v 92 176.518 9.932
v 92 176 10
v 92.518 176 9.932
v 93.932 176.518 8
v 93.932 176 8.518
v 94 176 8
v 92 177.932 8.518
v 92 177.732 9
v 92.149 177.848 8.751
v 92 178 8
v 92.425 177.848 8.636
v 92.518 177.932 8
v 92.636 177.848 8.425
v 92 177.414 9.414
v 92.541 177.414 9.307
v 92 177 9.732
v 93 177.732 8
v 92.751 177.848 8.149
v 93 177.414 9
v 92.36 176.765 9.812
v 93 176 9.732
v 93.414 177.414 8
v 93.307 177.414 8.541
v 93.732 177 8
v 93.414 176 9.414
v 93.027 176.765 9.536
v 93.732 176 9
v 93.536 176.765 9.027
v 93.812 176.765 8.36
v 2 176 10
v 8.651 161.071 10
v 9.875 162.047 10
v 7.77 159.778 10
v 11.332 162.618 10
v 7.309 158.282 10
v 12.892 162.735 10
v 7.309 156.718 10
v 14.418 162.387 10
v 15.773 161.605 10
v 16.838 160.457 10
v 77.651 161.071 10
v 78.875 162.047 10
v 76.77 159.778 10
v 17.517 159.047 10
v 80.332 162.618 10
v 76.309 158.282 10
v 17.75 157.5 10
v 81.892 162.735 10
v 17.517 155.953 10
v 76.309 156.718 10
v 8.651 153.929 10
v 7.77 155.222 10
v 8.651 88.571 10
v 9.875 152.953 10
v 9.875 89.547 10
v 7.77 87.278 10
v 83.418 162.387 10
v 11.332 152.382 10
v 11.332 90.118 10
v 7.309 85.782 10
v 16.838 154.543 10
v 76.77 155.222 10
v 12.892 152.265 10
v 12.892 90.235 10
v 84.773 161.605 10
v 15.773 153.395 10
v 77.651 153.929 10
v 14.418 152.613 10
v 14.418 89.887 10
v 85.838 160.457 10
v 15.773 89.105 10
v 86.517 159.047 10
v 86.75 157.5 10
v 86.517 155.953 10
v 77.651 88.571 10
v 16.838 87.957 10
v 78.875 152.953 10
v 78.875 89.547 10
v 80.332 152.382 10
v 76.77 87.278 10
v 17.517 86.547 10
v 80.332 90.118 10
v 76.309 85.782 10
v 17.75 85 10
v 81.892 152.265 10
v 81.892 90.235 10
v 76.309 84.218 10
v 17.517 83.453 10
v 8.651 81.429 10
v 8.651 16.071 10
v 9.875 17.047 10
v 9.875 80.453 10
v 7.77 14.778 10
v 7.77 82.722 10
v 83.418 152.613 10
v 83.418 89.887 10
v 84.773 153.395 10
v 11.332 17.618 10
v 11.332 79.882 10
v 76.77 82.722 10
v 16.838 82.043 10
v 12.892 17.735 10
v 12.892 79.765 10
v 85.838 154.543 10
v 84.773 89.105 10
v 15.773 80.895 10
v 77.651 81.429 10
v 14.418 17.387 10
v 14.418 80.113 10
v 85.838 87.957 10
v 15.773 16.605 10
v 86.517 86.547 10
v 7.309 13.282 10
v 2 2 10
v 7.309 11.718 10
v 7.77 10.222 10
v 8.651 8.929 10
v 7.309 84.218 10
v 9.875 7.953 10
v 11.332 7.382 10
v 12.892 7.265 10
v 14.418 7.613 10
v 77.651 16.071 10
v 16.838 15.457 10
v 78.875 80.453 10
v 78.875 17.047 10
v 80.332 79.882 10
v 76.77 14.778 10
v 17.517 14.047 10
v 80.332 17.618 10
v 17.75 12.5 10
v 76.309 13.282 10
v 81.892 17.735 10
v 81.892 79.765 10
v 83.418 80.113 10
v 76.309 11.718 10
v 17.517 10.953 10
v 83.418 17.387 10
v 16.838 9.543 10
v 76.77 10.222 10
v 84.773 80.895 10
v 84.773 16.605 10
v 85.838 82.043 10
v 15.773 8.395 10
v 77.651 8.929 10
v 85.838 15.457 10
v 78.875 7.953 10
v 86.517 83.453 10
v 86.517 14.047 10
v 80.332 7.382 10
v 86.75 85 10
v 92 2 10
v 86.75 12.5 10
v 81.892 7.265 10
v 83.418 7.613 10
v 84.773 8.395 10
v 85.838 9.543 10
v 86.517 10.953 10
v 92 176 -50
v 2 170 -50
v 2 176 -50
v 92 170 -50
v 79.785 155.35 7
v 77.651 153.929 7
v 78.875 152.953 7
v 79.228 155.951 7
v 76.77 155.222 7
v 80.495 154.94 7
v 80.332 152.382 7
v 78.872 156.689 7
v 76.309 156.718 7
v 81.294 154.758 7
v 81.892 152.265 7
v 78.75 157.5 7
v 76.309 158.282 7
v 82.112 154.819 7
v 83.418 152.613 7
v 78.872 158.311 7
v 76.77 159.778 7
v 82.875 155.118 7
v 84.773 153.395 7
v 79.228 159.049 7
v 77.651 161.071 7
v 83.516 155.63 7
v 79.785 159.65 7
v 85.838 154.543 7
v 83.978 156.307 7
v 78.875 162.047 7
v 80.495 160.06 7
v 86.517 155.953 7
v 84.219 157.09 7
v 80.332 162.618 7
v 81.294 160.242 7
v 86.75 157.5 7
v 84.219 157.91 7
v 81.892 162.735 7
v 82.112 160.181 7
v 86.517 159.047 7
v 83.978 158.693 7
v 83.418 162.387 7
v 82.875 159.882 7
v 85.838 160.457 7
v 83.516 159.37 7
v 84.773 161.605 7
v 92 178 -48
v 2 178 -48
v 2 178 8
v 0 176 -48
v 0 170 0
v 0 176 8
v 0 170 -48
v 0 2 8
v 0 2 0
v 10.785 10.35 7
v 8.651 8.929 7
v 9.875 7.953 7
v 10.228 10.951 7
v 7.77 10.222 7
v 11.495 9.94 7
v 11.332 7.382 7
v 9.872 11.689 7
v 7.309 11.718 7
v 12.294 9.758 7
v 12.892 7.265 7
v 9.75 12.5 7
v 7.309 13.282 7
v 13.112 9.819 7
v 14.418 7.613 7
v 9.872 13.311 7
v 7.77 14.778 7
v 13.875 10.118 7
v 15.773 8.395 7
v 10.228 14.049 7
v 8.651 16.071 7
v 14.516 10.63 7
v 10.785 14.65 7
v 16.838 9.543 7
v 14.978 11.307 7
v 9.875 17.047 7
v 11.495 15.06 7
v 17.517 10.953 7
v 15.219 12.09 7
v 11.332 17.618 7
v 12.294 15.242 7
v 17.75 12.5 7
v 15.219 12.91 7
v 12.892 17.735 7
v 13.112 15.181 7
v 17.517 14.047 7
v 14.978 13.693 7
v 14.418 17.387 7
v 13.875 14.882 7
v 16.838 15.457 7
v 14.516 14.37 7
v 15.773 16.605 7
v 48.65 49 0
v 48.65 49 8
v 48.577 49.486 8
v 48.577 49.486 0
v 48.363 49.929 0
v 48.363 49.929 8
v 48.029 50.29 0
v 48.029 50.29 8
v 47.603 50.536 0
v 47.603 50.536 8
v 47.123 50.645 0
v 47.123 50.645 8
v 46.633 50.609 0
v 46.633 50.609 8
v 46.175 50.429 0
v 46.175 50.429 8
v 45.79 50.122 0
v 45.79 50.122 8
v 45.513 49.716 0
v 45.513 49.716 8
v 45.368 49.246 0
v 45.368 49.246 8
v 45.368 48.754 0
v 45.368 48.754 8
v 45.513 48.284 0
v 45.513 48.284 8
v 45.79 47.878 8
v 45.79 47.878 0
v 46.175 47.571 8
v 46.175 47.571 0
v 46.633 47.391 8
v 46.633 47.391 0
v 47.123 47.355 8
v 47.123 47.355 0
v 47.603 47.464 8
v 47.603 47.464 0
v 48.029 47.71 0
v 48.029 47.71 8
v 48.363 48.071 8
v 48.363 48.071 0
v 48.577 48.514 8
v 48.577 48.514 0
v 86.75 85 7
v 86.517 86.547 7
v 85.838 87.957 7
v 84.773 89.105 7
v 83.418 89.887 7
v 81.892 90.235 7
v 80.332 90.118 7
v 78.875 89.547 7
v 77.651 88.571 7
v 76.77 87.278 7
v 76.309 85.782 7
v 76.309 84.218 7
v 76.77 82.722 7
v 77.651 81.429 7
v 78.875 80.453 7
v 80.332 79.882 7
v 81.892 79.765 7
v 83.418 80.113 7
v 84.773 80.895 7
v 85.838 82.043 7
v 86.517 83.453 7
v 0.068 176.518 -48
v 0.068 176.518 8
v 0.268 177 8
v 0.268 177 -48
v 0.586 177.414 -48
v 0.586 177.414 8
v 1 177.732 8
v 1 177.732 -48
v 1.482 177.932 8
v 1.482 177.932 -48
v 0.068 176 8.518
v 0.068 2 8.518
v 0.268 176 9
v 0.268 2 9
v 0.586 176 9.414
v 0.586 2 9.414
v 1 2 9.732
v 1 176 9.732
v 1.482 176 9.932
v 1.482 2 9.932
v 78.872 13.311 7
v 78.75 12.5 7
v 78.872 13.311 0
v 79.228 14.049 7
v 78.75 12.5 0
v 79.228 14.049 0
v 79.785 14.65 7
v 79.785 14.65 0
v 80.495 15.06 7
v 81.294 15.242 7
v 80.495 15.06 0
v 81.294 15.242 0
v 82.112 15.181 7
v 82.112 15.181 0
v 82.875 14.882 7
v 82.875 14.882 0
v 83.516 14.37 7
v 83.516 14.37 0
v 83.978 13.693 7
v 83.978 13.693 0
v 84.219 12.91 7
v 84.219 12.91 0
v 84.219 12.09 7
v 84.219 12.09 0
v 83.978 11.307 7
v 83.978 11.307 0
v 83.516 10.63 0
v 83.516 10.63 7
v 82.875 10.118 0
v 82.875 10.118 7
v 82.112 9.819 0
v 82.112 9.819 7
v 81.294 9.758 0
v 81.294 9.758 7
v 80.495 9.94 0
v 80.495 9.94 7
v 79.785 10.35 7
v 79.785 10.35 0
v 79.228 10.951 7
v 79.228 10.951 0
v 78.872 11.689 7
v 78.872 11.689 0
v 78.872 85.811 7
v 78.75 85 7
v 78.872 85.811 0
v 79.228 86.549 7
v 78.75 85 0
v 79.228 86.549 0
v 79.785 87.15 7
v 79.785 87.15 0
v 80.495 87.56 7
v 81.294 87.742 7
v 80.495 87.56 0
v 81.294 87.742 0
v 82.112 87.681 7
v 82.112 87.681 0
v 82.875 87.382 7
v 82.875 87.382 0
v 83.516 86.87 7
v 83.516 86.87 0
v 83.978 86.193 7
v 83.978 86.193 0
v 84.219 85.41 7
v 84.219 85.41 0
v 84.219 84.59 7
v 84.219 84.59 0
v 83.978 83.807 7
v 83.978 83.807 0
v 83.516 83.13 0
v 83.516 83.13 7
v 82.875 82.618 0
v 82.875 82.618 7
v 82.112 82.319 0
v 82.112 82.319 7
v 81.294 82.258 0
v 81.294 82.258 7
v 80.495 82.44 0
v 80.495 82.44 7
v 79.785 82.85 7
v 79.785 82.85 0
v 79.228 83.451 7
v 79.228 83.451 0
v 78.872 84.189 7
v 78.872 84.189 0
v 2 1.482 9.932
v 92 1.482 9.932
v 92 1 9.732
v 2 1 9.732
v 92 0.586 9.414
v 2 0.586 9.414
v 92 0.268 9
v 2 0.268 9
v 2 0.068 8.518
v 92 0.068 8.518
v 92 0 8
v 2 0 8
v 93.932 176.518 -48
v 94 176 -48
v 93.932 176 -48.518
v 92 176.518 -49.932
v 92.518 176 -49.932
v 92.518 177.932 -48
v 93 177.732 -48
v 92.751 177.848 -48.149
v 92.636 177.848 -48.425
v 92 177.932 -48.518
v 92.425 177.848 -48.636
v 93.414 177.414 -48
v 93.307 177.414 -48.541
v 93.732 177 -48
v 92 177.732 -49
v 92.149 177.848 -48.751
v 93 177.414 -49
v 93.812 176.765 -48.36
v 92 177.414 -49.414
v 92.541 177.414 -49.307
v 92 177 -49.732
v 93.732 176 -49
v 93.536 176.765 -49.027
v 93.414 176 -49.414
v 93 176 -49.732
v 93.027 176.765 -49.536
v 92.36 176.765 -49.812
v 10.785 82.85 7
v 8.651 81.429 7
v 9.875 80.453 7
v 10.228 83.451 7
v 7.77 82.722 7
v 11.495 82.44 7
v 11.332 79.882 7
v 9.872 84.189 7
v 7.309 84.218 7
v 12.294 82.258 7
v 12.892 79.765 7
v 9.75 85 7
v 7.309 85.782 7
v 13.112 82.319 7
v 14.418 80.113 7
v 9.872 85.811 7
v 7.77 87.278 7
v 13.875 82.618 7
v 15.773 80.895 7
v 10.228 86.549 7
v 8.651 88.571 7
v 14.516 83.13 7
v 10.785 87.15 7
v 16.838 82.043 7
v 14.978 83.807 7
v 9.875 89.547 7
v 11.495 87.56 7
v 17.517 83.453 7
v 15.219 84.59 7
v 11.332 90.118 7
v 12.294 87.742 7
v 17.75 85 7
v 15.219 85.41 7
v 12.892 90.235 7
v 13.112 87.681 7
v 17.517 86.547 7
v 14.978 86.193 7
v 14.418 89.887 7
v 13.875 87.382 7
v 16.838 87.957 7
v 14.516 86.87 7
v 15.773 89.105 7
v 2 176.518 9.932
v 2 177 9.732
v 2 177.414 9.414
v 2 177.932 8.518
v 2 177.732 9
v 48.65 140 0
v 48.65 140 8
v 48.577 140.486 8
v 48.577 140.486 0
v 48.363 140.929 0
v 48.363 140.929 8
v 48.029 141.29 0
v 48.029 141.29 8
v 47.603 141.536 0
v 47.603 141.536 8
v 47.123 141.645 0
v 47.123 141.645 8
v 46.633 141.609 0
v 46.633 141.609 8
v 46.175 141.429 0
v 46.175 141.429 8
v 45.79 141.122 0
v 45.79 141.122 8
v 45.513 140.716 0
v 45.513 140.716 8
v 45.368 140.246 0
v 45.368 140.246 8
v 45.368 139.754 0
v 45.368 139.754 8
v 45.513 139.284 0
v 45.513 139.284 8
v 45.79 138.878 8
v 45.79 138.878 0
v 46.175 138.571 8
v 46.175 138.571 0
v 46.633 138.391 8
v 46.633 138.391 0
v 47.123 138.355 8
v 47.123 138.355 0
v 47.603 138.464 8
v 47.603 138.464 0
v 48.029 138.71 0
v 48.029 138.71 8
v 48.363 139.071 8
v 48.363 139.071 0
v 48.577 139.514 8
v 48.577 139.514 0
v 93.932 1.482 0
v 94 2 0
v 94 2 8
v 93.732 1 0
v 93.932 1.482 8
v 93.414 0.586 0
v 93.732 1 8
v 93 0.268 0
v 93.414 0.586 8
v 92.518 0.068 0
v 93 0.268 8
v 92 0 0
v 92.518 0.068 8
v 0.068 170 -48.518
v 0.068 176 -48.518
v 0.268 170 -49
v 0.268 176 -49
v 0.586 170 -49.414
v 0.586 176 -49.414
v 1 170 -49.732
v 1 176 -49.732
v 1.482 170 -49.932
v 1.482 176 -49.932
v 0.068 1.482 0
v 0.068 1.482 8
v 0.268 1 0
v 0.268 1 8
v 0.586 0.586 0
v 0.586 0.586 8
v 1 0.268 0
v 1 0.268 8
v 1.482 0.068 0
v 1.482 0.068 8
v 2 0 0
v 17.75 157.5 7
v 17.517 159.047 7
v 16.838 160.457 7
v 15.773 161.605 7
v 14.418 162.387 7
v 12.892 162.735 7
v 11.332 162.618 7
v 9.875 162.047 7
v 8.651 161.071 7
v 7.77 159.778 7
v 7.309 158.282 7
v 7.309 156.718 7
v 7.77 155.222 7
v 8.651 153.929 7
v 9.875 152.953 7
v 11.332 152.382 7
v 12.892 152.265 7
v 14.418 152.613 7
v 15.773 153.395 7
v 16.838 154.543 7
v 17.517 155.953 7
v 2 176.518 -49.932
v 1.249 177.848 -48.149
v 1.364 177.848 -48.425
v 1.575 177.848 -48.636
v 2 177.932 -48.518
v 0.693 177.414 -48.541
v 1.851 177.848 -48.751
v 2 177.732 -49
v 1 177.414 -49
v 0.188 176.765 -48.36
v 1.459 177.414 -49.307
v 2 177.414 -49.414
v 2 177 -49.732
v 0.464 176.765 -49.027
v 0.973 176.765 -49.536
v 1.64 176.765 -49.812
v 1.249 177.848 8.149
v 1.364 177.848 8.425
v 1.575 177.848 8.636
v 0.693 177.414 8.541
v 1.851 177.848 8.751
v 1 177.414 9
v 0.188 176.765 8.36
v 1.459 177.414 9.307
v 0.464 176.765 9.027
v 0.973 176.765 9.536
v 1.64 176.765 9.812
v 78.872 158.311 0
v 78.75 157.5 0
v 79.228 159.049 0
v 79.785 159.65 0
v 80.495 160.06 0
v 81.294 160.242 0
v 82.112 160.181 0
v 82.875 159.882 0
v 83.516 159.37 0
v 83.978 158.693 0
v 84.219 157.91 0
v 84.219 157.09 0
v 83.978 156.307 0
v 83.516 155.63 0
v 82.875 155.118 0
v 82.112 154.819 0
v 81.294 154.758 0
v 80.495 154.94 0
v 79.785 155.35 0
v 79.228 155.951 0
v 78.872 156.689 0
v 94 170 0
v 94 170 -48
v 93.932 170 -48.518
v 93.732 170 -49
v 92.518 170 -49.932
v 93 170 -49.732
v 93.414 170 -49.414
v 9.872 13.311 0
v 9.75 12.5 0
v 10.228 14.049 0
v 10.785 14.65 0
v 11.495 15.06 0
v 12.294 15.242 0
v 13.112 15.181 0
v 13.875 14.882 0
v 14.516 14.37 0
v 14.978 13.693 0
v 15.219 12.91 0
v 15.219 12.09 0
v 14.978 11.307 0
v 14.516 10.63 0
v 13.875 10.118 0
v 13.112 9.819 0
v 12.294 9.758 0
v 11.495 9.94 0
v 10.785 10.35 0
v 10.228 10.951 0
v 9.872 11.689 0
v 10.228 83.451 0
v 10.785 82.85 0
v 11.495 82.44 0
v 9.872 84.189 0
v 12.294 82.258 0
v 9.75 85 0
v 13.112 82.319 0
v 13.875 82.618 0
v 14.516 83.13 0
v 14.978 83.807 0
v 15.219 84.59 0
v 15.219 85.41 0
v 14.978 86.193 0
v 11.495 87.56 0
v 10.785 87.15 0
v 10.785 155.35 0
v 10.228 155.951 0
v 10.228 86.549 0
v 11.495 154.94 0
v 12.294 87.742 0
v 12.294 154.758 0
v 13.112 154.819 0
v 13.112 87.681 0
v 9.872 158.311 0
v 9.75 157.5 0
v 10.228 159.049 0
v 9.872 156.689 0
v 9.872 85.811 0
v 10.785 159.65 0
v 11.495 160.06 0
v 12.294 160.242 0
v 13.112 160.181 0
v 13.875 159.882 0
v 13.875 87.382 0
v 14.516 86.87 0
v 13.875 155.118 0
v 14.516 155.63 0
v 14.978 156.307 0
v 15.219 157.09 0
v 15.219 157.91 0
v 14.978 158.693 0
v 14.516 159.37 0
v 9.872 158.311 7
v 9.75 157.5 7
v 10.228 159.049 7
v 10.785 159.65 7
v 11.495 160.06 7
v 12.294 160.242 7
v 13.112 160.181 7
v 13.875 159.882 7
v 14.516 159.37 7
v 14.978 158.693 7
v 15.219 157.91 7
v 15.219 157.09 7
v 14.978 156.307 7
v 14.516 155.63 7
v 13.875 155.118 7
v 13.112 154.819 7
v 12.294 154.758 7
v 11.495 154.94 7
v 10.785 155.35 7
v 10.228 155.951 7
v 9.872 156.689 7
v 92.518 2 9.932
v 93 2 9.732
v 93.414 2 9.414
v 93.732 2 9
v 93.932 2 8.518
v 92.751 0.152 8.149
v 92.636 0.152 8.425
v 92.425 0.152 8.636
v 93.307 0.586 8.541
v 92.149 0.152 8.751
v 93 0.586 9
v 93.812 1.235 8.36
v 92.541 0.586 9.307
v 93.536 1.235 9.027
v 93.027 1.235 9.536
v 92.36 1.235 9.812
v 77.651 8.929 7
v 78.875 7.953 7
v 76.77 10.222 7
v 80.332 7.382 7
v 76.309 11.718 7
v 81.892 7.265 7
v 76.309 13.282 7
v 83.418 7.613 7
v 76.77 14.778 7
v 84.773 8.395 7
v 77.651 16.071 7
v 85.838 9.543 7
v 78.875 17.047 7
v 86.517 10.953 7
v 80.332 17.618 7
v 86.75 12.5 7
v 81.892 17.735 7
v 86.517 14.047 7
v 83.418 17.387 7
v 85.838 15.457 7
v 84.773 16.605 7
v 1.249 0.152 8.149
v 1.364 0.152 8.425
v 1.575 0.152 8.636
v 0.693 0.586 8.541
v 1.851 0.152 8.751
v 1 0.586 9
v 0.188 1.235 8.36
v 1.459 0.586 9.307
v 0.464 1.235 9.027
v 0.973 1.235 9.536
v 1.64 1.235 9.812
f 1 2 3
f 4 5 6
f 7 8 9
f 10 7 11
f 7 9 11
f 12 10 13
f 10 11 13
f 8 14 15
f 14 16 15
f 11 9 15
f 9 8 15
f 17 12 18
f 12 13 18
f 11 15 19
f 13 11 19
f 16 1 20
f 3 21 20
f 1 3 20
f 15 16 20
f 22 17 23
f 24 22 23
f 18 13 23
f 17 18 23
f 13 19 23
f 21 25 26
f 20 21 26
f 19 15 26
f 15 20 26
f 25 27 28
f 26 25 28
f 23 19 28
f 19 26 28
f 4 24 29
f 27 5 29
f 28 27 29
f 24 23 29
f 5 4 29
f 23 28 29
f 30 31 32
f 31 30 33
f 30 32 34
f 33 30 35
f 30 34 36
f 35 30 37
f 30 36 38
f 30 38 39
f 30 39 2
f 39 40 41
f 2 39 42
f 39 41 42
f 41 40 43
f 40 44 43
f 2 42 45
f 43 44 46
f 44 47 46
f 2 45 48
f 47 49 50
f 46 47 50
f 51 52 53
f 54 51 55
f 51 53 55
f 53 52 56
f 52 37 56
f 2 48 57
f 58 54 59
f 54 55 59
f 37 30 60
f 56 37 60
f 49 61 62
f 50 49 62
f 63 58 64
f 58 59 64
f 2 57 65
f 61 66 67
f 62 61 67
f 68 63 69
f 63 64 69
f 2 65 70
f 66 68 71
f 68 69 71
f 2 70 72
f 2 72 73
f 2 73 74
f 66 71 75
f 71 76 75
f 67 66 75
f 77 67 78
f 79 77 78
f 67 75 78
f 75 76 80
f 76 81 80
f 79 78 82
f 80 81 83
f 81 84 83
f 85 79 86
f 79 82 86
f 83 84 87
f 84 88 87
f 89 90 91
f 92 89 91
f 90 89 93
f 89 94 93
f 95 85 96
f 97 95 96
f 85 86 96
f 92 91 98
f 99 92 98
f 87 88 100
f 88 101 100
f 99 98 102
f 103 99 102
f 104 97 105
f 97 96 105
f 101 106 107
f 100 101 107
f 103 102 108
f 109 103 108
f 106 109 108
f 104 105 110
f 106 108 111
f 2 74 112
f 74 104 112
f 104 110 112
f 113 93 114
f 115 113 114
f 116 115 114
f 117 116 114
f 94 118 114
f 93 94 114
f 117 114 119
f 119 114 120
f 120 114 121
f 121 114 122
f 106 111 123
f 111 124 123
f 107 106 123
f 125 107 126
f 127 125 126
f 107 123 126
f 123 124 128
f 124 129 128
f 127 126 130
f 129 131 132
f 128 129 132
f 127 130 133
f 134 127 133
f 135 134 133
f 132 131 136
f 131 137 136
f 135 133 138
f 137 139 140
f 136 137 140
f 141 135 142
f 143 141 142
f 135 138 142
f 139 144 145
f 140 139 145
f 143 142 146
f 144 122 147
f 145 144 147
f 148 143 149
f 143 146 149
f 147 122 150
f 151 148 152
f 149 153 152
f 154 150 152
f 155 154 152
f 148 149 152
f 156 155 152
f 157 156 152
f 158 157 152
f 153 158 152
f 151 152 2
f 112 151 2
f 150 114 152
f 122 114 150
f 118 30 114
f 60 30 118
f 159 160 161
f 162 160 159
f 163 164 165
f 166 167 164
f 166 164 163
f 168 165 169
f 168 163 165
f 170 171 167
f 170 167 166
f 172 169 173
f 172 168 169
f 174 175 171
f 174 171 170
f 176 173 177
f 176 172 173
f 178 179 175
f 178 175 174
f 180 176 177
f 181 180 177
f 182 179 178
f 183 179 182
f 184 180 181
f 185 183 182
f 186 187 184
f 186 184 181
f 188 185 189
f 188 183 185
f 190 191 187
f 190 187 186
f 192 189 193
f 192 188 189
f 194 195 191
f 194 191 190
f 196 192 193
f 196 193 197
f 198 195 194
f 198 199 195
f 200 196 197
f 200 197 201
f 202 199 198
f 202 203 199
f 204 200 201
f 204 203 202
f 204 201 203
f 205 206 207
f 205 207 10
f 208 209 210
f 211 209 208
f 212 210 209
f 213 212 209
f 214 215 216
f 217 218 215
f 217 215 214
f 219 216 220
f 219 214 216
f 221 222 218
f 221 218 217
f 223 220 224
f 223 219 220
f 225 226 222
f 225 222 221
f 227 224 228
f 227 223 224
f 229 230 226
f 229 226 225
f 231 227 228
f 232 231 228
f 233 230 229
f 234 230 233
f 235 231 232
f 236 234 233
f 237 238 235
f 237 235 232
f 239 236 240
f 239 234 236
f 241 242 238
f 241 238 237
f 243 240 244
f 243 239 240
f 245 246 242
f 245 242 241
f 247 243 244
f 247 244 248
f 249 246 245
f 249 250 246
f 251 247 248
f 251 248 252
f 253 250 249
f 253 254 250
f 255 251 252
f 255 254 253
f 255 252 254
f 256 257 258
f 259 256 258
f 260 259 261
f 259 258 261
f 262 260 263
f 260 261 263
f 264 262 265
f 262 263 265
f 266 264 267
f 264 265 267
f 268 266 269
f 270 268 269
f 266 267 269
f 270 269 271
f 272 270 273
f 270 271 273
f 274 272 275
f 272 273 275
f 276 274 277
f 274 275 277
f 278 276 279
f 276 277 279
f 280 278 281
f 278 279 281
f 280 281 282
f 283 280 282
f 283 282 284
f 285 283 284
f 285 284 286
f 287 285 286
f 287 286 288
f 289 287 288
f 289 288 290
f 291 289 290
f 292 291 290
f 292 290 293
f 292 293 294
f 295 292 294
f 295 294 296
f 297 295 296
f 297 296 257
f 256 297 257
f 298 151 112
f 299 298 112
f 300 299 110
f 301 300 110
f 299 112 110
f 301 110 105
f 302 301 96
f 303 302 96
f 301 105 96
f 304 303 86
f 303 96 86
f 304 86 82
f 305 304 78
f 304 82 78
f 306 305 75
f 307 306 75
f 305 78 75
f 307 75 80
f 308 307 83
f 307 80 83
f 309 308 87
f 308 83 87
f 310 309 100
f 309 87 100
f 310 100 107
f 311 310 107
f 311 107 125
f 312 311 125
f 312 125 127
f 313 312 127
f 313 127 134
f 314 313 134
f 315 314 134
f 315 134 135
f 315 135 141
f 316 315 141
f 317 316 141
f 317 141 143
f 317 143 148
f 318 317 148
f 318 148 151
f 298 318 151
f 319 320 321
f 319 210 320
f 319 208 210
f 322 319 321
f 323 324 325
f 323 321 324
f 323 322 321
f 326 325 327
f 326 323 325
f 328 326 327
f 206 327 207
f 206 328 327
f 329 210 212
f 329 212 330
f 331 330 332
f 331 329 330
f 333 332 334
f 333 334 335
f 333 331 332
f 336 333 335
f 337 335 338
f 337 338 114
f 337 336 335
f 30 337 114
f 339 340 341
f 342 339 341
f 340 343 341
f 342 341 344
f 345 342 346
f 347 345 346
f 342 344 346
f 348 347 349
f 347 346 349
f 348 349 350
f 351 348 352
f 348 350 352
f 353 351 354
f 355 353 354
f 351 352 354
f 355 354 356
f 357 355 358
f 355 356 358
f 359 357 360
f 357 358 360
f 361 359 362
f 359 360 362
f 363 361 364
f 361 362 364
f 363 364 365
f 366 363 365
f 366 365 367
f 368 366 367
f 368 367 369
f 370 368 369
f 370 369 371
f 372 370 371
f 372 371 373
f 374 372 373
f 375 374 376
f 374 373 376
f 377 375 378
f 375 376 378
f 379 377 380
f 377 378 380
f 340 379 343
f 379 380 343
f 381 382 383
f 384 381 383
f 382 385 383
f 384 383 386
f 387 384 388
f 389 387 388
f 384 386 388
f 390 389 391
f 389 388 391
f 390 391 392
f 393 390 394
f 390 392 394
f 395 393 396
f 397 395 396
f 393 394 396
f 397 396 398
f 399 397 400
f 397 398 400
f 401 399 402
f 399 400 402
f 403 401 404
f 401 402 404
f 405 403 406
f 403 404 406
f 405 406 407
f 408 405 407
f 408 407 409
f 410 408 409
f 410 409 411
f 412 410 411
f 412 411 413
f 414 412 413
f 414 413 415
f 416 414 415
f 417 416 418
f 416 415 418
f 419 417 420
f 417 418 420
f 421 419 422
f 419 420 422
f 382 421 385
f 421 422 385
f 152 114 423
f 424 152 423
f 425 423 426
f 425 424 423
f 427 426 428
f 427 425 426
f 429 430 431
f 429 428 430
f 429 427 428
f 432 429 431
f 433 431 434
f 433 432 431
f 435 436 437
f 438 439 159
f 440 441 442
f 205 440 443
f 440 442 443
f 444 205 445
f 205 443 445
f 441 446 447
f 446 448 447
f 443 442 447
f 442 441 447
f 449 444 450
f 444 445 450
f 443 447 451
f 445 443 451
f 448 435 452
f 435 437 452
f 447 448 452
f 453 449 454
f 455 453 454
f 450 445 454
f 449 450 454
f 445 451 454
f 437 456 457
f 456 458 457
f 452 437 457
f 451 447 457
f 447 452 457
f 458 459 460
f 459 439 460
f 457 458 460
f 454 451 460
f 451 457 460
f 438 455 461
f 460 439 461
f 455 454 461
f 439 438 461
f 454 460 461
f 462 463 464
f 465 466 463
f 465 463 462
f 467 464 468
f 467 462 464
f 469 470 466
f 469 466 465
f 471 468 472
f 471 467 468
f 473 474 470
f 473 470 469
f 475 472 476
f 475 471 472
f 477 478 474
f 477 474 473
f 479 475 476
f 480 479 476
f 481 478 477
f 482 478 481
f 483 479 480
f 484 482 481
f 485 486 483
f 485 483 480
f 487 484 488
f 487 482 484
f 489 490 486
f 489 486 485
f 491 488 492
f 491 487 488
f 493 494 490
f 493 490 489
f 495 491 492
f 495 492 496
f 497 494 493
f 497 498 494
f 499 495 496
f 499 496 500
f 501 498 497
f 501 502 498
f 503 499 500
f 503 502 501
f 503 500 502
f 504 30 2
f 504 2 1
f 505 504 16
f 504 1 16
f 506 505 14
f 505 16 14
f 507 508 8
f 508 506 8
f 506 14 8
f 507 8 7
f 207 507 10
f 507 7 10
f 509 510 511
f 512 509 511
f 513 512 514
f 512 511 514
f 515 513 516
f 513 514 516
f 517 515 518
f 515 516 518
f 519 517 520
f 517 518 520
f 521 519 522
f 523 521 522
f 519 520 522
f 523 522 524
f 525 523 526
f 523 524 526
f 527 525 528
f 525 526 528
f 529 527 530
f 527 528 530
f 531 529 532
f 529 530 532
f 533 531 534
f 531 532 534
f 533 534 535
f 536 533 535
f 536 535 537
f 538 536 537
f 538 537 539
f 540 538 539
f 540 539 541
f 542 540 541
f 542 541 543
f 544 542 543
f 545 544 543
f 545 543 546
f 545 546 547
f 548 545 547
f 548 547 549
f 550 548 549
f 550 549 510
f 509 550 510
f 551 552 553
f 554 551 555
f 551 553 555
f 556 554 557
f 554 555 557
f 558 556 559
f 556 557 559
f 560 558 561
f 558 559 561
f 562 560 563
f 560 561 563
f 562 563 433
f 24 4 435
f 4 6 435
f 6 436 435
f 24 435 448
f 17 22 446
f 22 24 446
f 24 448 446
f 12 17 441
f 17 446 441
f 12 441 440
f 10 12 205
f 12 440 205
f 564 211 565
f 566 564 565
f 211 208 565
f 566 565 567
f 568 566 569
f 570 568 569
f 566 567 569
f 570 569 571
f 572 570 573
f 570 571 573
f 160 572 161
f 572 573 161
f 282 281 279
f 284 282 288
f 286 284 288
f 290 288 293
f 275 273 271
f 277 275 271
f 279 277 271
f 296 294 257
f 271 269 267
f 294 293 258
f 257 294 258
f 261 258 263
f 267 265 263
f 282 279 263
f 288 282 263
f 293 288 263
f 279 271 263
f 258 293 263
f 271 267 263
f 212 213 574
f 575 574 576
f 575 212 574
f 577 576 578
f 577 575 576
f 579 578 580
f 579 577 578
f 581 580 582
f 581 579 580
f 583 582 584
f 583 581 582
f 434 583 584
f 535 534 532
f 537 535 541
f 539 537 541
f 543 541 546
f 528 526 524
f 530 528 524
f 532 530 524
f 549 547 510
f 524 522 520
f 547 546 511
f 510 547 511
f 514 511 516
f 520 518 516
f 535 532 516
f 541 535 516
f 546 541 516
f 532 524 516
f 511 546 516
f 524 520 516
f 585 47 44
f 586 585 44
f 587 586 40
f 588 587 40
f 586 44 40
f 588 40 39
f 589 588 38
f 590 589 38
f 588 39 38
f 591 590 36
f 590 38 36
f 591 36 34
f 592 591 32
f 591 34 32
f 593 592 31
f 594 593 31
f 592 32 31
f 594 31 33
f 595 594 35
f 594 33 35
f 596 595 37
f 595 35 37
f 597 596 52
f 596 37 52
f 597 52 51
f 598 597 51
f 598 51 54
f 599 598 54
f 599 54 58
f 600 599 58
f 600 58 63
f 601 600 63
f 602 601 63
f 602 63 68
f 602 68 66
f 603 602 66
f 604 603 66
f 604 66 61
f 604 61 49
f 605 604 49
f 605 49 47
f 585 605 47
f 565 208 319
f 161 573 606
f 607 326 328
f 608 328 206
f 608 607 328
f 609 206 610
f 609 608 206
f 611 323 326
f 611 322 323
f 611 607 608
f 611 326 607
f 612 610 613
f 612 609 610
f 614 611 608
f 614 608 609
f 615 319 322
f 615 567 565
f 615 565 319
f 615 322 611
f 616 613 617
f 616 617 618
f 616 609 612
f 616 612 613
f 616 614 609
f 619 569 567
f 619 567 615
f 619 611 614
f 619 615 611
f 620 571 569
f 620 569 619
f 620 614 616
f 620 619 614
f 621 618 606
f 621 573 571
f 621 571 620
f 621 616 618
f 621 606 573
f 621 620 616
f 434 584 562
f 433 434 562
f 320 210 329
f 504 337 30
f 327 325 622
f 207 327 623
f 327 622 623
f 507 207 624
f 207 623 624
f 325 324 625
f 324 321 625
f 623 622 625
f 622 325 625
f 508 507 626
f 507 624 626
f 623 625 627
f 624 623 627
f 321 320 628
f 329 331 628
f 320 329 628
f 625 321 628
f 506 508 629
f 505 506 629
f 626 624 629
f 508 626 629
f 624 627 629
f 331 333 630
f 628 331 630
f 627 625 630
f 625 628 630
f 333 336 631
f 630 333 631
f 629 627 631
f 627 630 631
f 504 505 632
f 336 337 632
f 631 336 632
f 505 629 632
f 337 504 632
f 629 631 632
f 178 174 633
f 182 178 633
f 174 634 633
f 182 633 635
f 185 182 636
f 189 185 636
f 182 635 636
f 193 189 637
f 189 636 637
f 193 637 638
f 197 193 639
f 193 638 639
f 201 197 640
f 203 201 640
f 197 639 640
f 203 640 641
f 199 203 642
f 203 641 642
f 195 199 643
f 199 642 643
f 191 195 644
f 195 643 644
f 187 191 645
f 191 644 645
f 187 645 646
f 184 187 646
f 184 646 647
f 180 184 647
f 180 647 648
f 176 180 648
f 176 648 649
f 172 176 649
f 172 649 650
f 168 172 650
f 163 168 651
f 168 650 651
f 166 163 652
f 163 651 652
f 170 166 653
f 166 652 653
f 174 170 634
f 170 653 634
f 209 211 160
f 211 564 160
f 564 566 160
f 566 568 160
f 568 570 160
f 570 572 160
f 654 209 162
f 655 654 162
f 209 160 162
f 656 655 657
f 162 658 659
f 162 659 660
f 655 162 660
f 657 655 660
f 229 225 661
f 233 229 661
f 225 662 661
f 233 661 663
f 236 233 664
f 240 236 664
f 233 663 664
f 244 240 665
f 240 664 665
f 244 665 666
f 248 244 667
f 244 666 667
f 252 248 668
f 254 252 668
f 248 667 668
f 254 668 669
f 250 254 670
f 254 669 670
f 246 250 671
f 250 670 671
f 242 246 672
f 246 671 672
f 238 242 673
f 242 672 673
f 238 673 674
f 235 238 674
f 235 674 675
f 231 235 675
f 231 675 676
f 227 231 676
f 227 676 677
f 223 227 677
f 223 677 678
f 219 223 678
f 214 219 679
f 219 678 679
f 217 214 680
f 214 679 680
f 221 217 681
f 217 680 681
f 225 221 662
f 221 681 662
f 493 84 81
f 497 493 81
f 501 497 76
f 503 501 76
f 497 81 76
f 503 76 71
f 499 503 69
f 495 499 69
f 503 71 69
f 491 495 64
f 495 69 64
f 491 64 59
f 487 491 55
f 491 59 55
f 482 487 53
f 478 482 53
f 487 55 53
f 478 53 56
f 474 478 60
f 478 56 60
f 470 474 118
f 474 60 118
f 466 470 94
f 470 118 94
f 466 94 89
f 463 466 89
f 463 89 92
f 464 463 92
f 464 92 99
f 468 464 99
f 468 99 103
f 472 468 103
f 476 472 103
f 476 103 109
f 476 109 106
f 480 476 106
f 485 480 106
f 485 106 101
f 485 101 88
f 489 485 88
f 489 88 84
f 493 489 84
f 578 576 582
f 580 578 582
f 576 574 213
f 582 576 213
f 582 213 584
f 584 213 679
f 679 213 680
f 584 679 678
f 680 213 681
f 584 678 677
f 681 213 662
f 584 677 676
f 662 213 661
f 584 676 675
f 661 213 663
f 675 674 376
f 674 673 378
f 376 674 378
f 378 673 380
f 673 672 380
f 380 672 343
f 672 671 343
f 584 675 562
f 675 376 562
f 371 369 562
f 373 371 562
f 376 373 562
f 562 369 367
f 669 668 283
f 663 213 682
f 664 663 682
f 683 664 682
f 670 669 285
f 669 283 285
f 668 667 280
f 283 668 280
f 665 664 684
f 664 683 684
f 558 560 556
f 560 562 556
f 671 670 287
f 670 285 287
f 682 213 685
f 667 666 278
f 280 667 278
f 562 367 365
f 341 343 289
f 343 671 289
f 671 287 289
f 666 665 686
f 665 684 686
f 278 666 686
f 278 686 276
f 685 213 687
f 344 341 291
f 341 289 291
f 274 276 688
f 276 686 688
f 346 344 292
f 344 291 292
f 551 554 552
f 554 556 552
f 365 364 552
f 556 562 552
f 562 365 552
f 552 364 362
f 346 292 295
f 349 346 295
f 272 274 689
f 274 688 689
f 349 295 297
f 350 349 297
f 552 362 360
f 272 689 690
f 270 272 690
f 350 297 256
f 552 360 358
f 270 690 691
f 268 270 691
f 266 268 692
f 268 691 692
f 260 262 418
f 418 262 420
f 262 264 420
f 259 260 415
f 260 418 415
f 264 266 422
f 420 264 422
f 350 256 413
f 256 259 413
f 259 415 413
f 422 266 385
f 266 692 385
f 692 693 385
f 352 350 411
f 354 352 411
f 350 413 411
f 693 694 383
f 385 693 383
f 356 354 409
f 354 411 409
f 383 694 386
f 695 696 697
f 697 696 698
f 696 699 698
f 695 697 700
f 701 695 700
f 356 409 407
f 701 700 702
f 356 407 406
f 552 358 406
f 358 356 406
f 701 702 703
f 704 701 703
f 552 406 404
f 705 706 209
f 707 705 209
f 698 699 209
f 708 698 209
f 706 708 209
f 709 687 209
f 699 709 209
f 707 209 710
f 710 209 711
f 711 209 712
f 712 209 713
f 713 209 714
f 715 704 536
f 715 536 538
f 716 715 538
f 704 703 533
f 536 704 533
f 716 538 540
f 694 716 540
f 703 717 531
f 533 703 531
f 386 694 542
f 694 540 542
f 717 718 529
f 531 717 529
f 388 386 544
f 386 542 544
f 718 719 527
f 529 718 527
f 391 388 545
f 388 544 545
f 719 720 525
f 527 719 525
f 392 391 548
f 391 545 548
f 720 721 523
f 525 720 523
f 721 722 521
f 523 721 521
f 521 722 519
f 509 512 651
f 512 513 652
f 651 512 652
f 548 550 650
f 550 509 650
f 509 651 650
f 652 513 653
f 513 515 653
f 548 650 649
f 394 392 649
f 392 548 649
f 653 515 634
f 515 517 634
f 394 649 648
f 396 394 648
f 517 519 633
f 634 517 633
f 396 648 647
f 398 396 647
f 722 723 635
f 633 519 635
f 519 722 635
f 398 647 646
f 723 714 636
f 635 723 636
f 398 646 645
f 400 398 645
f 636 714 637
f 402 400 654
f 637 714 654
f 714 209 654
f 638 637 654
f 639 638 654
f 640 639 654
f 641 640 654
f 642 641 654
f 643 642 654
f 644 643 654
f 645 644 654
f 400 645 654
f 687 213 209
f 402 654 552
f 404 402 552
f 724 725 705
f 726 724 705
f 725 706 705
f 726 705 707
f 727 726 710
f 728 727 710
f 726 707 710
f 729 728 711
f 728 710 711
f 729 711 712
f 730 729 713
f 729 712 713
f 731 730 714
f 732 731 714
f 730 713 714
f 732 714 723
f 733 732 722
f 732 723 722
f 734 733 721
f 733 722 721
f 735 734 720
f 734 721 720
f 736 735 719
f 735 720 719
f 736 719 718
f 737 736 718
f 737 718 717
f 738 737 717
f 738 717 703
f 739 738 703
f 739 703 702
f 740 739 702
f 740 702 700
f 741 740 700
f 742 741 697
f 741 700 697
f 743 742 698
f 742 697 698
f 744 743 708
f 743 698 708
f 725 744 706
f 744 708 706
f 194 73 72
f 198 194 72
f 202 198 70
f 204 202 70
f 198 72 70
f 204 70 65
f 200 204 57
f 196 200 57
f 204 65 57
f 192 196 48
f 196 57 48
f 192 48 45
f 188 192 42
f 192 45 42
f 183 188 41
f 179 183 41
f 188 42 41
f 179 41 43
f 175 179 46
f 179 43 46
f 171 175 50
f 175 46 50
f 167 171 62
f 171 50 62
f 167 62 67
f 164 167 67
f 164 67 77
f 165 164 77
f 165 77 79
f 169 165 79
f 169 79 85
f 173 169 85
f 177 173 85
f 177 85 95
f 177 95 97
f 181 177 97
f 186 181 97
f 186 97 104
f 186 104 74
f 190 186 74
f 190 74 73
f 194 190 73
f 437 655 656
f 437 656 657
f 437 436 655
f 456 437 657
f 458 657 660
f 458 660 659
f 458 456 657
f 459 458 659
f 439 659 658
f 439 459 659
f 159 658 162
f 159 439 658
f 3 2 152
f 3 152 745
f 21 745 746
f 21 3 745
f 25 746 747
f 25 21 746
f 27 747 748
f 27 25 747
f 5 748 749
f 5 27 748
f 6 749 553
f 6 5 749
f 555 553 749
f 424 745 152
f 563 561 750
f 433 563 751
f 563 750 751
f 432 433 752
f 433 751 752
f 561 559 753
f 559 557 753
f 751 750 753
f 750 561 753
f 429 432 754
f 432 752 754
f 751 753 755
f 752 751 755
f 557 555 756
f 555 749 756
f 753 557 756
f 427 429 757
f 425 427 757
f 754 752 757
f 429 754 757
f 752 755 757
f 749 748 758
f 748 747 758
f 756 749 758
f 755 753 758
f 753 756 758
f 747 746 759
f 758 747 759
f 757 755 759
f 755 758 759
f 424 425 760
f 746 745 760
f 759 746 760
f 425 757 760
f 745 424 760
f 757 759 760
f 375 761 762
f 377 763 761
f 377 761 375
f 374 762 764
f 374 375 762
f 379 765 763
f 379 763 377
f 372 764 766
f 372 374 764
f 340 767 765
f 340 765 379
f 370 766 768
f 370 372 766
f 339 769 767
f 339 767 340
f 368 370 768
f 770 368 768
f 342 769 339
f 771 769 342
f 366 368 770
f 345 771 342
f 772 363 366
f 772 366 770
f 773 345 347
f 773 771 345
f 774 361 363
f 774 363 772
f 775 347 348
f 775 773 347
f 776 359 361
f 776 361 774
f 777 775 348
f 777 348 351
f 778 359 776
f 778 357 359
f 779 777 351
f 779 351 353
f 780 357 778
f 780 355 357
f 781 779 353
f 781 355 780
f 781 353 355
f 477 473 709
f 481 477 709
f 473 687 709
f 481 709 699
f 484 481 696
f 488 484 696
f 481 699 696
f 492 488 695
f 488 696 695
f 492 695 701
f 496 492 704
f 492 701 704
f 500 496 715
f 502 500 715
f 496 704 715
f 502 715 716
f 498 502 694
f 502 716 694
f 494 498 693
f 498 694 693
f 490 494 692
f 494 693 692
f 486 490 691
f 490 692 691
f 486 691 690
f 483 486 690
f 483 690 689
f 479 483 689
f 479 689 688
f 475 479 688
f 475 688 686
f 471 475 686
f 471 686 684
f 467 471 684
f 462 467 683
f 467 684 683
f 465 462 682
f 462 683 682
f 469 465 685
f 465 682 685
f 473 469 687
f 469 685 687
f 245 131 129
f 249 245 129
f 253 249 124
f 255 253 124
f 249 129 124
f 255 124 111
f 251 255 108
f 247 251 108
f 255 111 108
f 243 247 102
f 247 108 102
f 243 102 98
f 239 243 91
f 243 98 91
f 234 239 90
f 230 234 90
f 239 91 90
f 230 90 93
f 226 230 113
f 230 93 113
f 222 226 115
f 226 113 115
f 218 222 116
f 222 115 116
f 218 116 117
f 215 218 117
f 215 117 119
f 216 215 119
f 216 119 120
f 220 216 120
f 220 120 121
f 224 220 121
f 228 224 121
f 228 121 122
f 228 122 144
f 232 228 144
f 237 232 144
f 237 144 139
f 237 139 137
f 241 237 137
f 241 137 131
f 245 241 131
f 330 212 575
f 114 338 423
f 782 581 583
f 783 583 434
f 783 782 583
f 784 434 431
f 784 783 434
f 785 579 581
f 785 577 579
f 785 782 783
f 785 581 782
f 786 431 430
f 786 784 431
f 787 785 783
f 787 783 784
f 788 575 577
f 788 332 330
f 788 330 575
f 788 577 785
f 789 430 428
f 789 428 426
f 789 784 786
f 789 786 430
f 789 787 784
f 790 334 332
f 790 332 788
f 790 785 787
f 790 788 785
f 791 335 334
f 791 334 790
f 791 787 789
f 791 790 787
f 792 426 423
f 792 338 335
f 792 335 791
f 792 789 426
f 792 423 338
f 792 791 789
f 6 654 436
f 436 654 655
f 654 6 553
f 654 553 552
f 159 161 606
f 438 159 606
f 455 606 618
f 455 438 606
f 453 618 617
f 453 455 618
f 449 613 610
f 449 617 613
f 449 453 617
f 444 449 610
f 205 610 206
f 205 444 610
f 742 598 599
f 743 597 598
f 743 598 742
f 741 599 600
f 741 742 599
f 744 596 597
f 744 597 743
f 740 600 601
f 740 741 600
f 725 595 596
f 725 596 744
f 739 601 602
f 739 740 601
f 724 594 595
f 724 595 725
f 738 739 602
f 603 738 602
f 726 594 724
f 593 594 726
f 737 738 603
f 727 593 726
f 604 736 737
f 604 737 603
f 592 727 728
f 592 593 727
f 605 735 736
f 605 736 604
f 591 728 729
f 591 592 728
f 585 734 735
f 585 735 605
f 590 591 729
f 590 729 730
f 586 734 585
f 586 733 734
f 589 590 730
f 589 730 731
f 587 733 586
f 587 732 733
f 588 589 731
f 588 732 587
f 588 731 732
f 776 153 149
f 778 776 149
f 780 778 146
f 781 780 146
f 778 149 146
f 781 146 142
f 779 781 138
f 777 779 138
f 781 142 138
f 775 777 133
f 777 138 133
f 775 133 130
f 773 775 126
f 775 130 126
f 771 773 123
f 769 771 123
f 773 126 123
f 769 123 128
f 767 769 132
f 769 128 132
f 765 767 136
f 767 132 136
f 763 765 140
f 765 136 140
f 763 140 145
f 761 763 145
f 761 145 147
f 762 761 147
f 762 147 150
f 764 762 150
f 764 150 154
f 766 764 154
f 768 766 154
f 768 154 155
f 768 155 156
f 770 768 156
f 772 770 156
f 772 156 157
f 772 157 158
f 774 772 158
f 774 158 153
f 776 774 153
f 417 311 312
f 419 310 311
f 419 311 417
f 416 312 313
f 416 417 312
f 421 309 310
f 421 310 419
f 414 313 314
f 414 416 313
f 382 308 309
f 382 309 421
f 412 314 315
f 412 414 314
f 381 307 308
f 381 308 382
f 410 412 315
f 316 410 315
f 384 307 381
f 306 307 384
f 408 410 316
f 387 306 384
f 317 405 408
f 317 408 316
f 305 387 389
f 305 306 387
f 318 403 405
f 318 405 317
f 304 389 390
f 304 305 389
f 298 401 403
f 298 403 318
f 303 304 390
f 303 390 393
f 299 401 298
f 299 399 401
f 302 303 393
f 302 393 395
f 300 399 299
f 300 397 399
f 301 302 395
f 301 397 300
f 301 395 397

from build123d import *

# Parameters (mm, degrees)
SKETCH1_W                       = 94
SKETCH1_H                       = 170
BOSS_EXTRUDE1_DEPTH             = 10
CBORE_FOR_M5_SBHCS1_D           = 5.5
CBORE_FOR_M5_SBHCS1_CBORE_D     = 10.5
CBORE_FOR_M5_SBHCS1_CBORE_DEPTH = 3
SKETCH4_W                       = 94
SKETCH4_H                       = 60
BOSS_EXTRUDE2_DEPTH             = 8
FILLET1_R                       = 2
M4X0_7_TAPPED_HOLE1_D           = 3.3
M4X0_7_TAPPED_HOLE1_DEPTH       = 8


with BuildPart() as part:
    # Sketch1 → Boss-Extrude1 (new body)
    with BuildSketch(Plane.XY):
        with Locations((47, 85)):
            Rectangle(SKETCH1_W, SKETCH1_H)
    extrude(amount=BOSS_EXTRUDE1_DEPTH)

    # CBORE for M5 SBHCS1 (through all)
    with Locations(Plane.XY.offset(10)):
        with Locations((81.5, 157.5), (12.5, 85), (12.5, 157.5), (81.5, 85), (12.5, 12.5), (81.5, 12.5)):
            CounterBoreHole(CBORE_FOR_M5_SBHCS1_D / 2, CBORE_FOR_M5_SBHCS1_CBORE_D / 2, CBORE_FOR_M5_SBHCS1_CBORE_DEPTH)

    # Sketch4 → Boss-Extrude2 (add)
    with BuildSketch(Plane(origin=(0, 170, 0), x_dir=(1, 0, 0), z_dir=(0, 1, 0))):
        with Locations((47, 20)):
            Rectangle(SKETCH4_W, SKETCH4_H)
    extrude(amount=BOSS_EXTRUDE2_DEPTH)

    # Fillet1
    fillet1_edges = [part.edges().sort_by_distance(p)[0] for p in [
        (94, 89, 10),
        (0, 89, 10),
        (0, 174, -50),
        (94, 174, -50),
        (0, 178, -20),
        (47, 178, 10),
        (94, 178, -20),
        (47, 178, -50),
        (94, 0, 5),
        (0, 0, 5),
        (47, 0, 10),
    ]]
    fillet(fillet1_edges, radius=FILLET1_R)

    # M4x0.7 Tapped Hole1
    with Locations(Plane(origin=(0, 0, 0), x_dir=(-1, 0, 0), z_dir=(0, 0, -1))):
        with Locations((-47, 140), (-47, 49)):
            Hole(M4X0_7_TAPPED_HOLE1_D / 2, depth=M4X0_7_TAPPED_HOLE1_DEPTH)


solid = part.part
